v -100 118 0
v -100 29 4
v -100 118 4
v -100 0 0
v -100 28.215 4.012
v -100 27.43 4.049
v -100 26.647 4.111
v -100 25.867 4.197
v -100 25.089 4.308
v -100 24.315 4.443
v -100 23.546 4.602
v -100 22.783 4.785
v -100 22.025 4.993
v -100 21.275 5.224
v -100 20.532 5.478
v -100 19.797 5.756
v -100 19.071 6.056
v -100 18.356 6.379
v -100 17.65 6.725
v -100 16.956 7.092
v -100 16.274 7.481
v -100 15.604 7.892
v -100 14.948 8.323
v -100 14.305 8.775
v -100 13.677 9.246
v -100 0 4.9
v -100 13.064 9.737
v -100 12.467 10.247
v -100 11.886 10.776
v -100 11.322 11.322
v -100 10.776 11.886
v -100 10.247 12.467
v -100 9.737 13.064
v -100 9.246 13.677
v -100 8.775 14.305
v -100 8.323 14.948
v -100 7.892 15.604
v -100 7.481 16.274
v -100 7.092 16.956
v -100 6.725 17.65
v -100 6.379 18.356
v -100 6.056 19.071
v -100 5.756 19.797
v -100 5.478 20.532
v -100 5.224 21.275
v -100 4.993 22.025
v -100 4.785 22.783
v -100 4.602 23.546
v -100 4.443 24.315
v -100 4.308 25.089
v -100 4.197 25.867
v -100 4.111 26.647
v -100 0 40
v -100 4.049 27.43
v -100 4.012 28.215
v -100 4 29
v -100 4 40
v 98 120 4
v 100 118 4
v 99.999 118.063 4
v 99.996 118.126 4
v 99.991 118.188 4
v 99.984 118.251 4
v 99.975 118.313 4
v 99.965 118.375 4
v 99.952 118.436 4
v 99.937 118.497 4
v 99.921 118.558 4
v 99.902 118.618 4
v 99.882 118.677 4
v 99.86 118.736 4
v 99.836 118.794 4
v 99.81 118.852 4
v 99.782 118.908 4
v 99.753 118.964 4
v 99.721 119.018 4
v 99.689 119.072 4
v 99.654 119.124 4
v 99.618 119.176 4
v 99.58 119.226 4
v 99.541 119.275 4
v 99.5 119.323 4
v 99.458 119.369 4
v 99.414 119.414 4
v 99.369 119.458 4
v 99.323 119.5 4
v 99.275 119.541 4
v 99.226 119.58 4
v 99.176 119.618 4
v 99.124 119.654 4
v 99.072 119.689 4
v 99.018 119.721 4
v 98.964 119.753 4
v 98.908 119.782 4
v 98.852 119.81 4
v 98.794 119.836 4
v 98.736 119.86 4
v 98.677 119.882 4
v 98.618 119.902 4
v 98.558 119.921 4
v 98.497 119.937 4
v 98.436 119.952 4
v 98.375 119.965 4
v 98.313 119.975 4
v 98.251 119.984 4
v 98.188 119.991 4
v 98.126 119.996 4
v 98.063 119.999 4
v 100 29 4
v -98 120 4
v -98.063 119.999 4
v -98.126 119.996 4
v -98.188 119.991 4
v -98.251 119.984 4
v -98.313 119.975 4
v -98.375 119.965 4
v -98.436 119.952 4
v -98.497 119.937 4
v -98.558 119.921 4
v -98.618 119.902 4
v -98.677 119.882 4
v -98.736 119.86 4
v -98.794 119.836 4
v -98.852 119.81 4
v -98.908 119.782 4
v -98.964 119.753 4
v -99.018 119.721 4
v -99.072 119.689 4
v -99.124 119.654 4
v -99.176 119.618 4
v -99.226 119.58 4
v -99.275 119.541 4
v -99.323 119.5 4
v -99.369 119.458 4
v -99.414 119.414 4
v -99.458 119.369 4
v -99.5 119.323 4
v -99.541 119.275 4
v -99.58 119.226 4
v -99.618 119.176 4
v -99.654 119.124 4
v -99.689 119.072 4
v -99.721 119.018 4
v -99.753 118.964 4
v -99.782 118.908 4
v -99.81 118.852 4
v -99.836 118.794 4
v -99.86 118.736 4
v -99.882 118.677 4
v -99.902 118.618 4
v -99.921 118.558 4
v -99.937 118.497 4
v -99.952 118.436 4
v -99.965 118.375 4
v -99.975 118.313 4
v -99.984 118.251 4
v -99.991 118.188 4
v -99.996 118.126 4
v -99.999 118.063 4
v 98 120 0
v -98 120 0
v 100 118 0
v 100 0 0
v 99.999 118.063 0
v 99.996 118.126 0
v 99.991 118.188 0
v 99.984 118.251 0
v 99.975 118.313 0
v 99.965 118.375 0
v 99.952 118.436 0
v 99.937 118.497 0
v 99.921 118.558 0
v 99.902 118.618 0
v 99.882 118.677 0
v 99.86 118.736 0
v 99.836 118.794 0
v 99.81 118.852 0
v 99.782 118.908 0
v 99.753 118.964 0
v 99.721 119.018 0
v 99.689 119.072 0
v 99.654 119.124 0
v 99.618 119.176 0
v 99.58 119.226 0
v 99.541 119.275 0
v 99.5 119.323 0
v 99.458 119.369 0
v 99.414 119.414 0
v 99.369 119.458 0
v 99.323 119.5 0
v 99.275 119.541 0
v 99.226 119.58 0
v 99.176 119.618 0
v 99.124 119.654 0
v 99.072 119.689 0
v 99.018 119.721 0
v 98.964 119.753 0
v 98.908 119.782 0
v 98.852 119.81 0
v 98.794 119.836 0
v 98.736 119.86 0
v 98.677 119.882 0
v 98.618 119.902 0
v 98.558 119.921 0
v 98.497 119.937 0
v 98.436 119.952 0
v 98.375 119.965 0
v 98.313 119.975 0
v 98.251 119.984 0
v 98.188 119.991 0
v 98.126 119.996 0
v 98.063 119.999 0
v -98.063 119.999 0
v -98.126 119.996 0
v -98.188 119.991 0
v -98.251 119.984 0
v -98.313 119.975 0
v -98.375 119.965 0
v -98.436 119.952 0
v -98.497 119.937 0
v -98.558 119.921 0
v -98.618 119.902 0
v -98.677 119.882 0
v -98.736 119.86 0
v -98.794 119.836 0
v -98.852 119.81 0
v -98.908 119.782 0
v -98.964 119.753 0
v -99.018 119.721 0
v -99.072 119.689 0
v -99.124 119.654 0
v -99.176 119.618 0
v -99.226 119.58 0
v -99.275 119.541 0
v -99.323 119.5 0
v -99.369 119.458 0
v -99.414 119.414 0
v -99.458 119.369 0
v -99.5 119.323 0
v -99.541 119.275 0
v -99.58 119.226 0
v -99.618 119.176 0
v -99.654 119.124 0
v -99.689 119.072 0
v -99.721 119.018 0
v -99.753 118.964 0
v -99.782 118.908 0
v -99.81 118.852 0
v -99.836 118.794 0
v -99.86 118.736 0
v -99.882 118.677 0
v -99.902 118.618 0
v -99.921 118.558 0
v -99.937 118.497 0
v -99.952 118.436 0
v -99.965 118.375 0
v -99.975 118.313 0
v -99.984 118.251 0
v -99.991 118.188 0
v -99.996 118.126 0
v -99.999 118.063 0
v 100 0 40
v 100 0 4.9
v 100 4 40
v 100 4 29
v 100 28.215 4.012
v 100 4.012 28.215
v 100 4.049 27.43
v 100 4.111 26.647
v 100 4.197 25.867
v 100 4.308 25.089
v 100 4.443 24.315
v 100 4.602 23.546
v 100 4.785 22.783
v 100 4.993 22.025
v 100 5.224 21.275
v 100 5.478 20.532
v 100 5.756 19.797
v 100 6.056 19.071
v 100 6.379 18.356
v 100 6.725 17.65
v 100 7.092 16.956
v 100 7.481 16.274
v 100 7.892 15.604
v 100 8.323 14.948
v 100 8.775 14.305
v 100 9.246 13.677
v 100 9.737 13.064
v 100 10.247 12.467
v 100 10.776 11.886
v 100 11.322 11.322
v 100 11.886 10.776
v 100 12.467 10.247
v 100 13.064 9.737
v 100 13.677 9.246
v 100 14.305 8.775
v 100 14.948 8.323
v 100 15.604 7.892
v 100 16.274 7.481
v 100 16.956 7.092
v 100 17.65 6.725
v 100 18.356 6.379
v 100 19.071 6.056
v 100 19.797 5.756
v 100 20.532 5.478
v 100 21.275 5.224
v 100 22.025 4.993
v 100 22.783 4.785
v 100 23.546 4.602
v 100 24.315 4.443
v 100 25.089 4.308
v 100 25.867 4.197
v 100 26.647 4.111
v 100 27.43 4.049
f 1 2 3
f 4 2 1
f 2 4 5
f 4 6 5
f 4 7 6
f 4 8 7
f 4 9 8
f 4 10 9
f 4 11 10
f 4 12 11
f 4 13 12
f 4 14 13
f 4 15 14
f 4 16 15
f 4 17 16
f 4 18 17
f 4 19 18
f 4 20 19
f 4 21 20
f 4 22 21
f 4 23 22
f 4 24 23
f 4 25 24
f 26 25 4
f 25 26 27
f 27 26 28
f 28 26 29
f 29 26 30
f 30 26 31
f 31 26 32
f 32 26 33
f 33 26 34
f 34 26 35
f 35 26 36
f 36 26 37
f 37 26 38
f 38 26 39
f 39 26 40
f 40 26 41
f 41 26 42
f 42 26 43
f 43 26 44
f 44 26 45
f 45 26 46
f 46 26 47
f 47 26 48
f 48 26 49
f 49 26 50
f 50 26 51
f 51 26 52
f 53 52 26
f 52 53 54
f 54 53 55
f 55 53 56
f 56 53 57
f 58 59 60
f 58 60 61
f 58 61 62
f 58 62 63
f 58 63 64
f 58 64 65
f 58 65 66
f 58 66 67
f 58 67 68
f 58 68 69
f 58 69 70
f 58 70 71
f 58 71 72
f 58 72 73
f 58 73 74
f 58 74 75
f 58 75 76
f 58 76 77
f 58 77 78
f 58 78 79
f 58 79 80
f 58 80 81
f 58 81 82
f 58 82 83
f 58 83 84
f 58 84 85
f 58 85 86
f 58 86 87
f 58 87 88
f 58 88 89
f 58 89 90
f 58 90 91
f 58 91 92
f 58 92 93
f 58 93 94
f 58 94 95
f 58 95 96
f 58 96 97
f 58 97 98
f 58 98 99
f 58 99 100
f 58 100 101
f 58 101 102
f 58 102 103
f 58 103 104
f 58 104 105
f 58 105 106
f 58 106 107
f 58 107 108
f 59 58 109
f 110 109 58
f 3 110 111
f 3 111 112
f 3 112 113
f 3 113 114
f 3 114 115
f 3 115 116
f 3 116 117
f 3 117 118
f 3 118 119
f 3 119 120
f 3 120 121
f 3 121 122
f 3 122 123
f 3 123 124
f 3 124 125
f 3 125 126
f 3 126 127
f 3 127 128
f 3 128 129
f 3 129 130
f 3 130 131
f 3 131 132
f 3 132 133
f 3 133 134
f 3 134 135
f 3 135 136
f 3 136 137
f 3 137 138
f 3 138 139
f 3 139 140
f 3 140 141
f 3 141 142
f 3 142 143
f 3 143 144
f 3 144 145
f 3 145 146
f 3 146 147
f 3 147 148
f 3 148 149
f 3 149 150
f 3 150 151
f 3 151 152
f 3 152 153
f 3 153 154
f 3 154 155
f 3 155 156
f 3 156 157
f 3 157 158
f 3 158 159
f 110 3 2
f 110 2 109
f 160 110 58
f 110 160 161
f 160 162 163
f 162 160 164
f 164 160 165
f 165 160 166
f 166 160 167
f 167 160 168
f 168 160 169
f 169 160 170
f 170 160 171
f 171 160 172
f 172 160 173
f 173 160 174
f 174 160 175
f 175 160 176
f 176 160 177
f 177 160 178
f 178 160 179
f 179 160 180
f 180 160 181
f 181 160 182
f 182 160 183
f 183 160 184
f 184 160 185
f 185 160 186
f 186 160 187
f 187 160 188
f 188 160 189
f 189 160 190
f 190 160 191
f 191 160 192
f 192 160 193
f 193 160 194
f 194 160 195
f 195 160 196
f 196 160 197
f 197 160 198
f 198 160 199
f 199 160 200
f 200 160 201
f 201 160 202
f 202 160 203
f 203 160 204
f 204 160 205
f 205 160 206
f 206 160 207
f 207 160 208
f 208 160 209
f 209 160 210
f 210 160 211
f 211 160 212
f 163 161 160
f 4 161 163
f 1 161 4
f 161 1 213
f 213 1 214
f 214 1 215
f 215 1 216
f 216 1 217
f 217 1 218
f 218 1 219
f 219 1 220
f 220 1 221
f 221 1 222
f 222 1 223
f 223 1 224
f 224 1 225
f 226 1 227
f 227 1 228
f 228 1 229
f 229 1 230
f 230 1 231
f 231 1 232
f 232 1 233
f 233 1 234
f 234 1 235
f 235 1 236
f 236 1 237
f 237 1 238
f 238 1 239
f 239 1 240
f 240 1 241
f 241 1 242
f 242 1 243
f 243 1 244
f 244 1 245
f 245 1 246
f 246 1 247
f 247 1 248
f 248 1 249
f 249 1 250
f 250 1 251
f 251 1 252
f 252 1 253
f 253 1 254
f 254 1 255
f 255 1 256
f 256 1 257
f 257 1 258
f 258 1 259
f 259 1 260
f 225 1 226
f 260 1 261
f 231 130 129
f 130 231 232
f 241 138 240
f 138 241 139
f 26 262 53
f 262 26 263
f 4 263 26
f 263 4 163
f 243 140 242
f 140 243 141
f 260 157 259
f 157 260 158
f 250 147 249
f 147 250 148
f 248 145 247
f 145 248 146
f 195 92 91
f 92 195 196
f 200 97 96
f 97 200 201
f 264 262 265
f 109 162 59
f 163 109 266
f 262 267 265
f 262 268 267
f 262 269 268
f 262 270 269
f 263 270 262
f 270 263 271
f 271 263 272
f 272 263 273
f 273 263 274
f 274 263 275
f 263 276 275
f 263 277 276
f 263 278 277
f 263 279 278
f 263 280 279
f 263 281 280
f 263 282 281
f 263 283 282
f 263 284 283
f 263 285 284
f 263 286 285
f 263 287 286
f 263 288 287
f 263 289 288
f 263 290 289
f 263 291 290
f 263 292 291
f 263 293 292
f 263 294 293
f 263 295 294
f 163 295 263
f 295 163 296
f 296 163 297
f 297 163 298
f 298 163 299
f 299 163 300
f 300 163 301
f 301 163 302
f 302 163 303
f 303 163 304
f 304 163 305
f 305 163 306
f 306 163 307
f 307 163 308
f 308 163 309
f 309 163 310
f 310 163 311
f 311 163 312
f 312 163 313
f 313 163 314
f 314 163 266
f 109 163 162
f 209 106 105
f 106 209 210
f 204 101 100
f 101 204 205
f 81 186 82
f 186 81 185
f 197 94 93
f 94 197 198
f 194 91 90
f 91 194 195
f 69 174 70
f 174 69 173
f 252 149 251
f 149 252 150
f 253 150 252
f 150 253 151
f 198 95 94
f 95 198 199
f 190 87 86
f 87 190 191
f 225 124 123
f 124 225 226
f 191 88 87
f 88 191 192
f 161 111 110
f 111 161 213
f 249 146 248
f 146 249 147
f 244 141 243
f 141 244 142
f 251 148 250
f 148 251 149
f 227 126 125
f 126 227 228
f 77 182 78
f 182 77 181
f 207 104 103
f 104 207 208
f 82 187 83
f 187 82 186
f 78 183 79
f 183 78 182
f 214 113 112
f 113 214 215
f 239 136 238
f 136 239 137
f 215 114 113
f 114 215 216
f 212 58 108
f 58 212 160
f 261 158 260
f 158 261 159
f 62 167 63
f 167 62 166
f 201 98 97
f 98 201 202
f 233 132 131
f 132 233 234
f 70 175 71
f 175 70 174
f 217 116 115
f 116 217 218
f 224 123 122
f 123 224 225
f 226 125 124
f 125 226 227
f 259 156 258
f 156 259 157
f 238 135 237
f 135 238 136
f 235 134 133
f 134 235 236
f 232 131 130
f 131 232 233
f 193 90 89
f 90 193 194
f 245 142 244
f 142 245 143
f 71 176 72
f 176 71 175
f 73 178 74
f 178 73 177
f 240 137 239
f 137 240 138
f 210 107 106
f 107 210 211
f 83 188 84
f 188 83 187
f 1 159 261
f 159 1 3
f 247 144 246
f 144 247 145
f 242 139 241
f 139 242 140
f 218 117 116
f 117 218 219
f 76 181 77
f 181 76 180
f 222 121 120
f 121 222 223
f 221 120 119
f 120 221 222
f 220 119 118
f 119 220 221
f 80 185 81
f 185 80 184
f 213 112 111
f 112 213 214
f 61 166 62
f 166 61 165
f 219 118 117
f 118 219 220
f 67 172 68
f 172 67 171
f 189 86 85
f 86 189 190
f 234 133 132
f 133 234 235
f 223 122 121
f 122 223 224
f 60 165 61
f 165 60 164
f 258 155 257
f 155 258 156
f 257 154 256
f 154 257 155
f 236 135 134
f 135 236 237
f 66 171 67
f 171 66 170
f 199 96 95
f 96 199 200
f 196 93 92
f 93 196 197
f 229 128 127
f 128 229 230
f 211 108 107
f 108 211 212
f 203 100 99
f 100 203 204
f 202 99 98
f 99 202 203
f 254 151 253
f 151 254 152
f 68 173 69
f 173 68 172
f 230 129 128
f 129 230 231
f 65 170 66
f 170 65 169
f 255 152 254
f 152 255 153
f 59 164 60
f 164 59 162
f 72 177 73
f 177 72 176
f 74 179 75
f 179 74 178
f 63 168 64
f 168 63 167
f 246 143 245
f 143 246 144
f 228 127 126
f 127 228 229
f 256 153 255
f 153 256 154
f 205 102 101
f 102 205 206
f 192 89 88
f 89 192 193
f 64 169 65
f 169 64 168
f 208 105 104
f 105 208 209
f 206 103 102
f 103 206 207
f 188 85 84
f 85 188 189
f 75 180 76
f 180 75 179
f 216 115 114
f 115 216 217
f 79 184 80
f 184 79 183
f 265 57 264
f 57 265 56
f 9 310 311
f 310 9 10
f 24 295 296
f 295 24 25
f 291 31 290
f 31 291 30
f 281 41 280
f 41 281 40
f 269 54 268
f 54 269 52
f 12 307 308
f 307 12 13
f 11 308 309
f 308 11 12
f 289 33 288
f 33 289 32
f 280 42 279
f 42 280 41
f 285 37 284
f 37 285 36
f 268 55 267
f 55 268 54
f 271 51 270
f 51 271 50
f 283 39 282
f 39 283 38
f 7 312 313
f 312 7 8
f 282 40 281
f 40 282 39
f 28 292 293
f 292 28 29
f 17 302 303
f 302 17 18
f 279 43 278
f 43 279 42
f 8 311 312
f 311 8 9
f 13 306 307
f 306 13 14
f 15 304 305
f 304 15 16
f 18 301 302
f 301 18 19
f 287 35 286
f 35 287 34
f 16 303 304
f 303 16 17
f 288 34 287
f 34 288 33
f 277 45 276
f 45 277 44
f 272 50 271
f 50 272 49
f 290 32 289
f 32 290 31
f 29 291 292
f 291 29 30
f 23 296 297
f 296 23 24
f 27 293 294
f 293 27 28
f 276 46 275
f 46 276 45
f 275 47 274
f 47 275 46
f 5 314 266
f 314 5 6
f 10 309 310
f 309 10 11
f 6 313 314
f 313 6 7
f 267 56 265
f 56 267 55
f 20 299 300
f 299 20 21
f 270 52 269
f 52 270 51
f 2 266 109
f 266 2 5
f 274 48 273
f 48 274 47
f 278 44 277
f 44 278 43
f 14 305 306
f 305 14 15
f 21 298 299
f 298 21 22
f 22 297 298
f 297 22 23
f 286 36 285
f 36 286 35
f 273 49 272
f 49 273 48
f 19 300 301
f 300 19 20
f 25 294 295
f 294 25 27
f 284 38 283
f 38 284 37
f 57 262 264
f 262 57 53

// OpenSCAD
$fn=200;

t=4;
x=200;
y=120;
z=40;


difference(){
    union(){
        *cylinder(d=x, h=t);
        translate([-x/2,0,0])
        rcube(x,y,t,2);
        
        translate([-x/2,0,0])
        cube([x,t,z]);
        
        translate([x/2,t,t])
        rotate([0,0,90])
        fillet(25,x);
    }
    
    translate([-x/2,-x,-.1])
    cube([x,x,t+1]);
}

//------------------------------
module fillet(s=1, t=1) {
    difference() {
        cube([s, t, s]);
                
        translate([s*1,-0.1,s])
        rotate([-90,0,0])
        cylinder(d=s*2, h=t*2);
    }
}

module rcube(length,width,height,radius=.5,chamfer=0){    
    l=length-2*radius;
    w=width-2*radius;    
    difference(){
        translate([radius,radius,0])
        hull(){
            cylinder(r=radius,h=height);    
            translate([0,w,0])
            cylinder(r=radius,h=height);    
            translate([l,0,0])
            cylinder(r=radius,h=height);    
            translate([l,w,0])
            cylinder(r=radius,h=height);    
        }
        /*******************************/
        difference(){
            translate([-.1,-.1,-.1])
                cube([length+.2,width+.2,chamfer]);
            /*******************************/
            hull(){
                translate([-.1,-.1,chamfer])
                cube([length+.2,width+.2,.1]);
                translate([chamfer,chamfer-.1])
                cube([length-chamfer*2,width-chamfer*2,.1]);
            }
        }
    }
}
